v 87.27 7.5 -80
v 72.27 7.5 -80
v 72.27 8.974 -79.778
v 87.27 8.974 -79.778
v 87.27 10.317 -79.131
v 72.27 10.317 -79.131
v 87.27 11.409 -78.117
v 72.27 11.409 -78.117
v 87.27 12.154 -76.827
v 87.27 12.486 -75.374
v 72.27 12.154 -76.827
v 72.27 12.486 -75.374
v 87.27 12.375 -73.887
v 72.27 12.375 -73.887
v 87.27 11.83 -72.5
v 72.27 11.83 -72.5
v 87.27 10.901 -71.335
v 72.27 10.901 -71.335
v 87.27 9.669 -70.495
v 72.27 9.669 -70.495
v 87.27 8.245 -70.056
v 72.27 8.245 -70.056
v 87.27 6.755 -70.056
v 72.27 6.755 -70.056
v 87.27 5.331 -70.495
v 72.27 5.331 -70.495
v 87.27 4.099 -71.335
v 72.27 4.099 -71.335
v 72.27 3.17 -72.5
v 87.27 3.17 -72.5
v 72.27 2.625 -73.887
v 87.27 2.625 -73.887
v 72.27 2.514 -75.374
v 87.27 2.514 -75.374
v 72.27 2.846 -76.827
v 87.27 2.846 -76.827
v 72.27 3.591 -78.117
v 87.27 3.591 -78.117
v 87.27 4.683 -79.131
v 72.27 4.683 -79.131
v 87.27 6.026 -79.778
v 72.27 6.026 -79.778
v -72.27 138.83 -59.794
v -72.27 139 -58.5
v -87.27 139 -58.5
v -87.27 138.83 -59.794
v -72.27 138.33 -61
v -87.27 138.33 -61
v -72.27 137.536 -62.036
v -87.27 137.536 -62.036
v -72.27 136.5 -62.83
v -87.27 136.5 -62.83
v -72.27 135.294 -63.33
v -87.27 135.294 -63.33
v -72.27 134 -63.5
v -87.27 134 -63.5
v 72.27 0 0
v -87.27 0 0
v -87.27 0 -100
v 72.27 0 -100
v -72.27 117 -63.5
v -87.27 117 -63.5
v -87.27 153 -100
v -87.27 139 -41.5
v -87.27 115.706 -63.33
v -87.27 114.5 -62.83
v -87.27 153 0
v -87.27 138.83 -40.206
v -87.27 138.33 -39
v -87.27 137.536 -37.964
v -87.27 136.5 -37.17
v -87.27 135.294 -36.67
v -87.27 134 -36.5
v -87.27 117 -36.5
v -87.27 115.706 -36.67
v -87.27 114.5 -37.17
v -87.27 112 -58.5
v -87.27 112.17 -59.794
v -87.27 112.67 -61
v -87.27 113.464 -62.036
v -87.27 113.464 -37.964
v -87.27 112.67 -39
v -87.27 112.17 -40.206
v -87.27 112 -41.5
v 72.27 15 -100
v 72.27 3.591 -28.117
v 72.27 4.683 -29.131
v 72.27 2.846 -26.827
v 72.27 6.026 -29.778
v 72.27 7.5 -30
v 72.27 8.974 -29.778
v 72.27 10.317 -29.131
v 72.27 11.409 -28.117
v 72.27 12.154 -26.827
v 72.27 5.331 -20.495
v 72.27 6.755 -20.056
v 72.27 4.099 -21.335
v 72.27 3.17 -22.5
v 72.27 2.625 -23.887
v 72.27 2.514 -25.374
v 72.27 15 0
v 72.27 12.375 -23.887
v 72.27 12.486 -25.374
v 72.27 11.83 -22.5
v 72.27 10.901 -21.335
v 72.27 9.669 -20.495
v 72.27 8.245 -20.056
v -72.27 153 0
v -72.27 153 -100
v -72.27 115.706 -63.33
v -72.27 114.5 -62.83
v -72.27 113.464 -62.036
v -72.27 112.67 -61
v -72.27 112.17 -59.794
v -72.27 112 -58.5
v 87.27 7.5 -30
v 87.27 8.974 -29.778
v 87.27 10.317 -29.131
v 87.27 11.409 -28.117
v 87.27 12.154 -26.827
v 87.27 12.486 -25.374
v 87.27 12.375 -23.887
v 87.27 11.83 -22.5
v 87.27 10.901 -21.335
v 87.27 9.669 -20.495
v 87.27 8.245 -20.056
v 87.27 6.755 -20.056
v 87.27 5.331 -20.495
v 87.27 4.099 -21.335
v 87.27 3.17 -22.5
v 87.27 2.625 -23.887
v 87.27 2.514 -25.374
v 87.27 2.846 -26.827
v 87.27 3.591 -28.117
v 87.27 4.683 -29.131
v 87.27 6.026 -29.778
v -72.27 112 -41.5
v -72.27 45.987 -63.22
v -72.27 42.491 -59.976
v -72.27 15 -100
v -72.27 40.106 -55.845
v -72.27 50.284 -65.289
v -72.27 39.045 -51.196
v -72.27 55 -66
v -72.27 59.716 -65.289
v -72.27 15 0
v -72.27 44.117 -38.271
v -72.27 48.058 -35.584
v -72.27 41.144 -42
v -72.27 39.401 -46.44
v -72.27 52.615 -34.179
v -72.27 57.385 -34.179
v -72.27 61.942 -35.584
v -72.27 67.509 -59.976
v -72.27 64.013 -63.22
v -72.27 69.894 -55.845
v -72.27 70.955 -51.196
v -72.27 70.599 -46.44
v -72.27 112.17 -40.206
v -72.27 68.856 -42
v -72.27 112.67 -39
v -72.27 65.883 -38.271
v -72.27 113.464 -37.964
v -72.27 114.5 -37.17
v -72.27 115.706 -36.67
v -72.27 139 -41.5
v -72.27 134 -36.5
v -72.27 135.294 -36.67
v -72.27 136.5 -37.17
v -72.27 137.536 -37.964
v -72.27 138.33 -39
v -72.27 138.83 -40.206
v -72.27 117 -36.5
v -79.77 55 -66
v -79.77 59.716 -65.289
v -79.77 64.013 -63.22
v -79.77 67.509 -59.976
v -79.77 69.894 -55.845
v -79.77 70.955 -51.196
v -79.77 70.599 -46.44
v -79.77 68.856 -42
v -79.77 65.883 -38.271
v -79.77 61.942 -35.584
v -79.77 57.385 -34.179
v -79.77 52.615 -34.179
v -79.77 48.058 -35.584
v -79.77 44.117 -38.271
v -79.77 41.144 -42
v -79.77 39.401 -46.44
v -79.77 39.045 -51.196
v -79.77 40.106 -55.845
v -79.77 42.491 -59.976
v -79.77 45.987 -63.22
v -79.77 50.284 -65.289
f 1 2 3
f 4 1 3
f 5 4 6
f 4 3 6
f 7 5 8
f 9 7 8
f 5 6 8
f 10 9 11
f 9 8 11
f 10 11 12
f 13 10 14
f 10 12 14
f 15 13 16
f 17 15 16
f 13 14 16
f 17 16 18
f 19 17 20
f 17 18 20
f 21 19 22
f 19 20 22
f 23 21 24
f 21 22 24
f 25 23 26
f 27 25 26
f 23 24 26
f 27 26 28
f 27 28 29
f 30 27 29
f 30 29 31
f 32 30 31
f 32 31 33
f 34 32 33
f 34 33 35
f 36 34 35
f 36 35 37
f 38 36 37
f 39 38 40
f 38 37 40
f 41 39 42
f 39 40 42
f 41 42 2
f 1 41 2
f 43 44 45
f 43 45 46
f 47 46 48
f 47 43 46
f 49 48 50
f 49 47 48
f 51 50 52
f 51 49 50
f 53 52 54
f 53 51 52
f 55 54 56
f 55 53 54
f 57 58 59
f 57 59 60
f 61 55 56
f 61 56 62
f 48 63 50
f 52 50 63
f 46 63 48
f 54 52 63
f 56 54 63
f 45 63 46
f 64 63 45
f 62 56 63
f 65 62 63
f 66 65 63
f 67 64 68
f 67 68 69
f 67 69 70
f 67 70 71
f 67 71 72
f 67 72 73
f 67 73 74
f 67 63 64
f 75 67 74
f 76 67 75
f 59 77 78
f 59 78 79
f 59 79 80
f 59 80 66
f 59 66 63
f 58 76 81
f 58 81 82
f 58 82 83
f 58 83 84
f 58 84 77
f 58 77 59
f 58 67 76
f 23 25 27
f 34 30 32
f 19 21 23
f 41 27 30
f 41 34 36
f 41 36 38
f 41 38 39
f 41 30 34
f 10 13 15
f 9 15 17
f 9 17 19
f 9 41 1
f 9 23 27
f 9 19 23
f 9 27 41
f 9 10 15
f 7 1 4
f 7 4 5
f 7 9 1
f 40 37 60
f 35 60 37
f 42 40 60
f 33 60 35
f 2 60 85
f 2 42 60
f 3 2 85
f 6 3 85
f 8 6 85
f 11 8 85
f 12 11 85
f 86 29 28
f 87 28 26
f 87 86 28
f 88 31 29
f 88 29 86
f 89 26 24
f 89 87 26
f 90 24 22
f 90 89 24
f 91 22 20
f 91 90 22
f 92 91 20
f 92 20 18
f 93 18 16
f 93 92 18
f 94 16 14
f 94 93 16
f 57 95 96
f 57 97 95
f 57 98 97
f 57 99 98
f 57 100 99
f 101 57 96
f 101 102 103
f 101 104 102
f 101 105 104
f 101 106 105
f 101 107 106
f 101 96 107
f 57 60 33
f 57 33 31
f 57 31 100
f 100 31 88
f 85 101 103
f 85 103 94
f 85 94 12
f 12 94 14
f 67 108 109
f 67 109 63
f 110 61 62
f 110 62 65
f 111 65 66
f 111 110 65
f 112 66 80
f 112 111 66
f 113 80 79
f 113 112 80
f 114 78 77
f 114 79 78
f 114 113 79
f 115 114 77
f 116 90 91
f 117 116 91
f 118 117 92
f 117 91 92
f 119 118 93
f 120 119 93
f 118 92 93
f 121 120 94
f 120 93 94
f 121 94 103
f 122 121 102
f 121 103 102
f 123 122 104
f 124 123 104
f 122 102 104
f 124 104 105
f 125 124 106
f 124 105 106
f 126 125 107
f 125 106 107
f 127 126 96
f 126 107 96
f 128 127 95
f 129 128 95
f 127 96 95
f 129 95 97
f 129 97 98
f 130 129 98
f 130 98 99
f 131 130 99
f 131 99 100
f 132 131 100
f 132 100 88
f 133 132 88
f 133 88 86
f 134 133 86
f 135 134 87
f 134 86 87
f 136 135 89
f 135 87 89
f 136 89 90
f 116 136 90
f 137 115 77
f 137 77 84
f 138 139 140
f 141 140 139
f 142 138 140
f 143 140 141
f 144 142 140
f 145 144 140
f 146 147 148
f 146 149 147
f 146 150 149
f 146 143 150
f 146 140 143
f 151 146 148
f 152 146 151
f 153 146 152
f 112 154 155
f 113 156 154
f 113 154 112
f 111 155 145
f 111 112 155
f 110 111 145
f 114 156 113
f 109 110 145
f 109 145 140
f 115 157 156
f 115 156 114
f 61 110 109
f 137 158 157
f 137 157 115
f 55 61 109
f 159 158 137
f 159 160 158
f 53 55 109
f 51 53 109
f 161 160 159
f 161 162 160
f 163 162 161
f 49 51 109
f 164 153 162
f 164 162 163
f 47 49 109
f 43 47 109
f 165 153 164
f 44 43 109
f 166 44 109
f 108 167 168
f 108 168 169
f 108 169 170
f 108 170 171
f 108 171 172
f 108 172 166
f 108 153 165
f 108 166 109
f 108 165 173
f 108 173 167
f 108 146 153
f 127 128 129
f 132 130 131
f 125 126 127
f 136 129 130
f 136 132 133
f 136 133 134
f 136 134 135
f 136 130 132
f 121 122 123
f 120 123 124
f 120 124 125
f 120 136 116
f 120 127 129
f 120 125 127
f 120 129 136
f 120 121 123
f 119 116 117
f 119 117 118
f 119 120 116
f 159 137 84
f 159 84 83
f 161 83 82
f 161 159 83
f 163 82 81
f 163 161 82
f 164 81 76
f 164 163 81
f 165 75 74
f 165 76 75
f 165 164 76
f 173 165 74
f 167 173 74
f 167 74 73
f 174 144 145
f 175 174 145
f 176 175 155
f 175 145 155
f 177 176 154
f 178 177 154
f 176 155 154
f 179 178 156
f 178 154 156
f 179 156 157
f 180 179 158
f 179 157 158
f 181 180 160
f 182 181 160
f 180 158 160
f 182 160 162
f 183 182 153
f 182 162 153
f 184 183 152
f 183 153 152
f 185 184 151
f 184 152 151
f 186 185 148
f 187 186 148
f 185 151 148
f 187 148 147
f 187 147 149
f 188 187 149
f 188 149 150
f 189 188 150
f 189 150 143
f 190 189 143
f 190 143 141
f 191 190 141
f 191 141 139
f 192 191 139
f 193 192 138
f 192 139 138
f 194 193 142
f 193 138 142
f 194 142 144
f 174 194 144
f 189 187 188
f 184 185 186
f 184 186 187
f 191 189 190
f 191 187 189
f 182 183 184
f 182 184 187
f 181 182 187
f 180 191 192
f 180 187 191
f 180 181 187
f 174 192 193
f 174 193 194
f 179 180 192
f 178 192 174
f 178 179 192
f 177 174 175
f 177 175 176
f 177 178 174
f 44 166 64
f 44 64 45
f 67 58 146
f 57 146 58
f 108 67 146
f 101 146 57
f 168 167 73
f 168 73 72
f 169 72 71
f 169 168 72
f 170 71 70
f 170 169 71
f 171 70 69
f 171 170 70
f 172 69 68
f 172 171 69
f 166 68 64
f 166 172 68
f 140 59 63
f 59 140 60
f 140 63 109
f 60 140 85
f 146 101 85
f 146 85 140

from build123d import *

# Parameters (mm, degrees)
Y_KSEKLIK_EKSTR_ZYON1_DEPTH = 100
IZIM4_R                     = 5
Y_KSEKLIK_EKSTR_ZYON2_DEPTH = 15
IZIM2_R                     = 16
KES_EKSTR_ZYON7_DEPTH       = 7.5
KES_EKSTR_ZYON8_DEPTH       = 16


with BuildPart() as part:
    # Çizim1 → Yükseklik-Ekstrüzyon1 (new body)
    with BuildSketch(Plane.XY):
        Polygon((-87.26990817, 0), (72.26990817, 0), (72.26990817, 15), (-72.26990817, 15), (-72.26990817, 153), (-87.26990817, 153), align=None)
    extrude(amount=-Y_KSEKLIK_EKSTR_ZYON1_DEPTH)

    # Çizim4 → Yükseklik-Ekstrüzyon2 (add)
    with BuildSketch(Plane(origin=(72.26990817, 0, 0), x_dir=(0, 0, -1), z_dir=(1, 0, 0))):
        with Locations((25, 7.5)):
            Circle(IZIM4_R)
        with Locations((75, 7.5)):
            Circle(IZIM4_R)
    extrude(amount=Y_KSEKLIK_EKSTR_ZYON2_DEPTH)

    # Çizim2 → Kes-Ekstrüzyon7 (cut)
    with BuildSketch(Plane(origin=(-72.26990817, 0, 0), x_dir=(0, 0, -1), z_dir=(1, 0, 0))):
        with Locations((50, 55)):
            Circle(IZIM2_R)
    extrude(amount=-KES_EKSTR_ZYON7_DEPTH, mode=Mode.SUBTRACT)

    # Çizim3 → Kes-Ekstrüzyon8 (cut, through all)
    with BuildSketch(Plane(origin=(-72.26990817, 0, 0), x_dir=(0, 0, -1), z_dir=(1, 0, 0))):
        with BuildLine():
            Line((41.5, 139), (58.5, 139))
            ThreePointArc((58.5, 139), (62.035533906, 137.535533906), (63.5, 134))
            Line((63.5, 134), (63.5, 117))
            ThreePointArc((63.5, 117), (62.035533906, 113.464466094), (58.5, 112))
            Line((58.5, 112), (41.5, 112))
            ThreePointArc((41.5, 112), (37.964466094, 113.464466094), (36.5, 117))
            Line((36.5, 117), (36.5, 134))
            ThreePointArc((36.5, 134), (37.964466094, 137.535533906), (41.5, 139))
        make_face()
    extrude(amount=-KES_EKSTR_ZYON8_DEPTH, mode=Mode.SUBTRACT)


solid = part.part
